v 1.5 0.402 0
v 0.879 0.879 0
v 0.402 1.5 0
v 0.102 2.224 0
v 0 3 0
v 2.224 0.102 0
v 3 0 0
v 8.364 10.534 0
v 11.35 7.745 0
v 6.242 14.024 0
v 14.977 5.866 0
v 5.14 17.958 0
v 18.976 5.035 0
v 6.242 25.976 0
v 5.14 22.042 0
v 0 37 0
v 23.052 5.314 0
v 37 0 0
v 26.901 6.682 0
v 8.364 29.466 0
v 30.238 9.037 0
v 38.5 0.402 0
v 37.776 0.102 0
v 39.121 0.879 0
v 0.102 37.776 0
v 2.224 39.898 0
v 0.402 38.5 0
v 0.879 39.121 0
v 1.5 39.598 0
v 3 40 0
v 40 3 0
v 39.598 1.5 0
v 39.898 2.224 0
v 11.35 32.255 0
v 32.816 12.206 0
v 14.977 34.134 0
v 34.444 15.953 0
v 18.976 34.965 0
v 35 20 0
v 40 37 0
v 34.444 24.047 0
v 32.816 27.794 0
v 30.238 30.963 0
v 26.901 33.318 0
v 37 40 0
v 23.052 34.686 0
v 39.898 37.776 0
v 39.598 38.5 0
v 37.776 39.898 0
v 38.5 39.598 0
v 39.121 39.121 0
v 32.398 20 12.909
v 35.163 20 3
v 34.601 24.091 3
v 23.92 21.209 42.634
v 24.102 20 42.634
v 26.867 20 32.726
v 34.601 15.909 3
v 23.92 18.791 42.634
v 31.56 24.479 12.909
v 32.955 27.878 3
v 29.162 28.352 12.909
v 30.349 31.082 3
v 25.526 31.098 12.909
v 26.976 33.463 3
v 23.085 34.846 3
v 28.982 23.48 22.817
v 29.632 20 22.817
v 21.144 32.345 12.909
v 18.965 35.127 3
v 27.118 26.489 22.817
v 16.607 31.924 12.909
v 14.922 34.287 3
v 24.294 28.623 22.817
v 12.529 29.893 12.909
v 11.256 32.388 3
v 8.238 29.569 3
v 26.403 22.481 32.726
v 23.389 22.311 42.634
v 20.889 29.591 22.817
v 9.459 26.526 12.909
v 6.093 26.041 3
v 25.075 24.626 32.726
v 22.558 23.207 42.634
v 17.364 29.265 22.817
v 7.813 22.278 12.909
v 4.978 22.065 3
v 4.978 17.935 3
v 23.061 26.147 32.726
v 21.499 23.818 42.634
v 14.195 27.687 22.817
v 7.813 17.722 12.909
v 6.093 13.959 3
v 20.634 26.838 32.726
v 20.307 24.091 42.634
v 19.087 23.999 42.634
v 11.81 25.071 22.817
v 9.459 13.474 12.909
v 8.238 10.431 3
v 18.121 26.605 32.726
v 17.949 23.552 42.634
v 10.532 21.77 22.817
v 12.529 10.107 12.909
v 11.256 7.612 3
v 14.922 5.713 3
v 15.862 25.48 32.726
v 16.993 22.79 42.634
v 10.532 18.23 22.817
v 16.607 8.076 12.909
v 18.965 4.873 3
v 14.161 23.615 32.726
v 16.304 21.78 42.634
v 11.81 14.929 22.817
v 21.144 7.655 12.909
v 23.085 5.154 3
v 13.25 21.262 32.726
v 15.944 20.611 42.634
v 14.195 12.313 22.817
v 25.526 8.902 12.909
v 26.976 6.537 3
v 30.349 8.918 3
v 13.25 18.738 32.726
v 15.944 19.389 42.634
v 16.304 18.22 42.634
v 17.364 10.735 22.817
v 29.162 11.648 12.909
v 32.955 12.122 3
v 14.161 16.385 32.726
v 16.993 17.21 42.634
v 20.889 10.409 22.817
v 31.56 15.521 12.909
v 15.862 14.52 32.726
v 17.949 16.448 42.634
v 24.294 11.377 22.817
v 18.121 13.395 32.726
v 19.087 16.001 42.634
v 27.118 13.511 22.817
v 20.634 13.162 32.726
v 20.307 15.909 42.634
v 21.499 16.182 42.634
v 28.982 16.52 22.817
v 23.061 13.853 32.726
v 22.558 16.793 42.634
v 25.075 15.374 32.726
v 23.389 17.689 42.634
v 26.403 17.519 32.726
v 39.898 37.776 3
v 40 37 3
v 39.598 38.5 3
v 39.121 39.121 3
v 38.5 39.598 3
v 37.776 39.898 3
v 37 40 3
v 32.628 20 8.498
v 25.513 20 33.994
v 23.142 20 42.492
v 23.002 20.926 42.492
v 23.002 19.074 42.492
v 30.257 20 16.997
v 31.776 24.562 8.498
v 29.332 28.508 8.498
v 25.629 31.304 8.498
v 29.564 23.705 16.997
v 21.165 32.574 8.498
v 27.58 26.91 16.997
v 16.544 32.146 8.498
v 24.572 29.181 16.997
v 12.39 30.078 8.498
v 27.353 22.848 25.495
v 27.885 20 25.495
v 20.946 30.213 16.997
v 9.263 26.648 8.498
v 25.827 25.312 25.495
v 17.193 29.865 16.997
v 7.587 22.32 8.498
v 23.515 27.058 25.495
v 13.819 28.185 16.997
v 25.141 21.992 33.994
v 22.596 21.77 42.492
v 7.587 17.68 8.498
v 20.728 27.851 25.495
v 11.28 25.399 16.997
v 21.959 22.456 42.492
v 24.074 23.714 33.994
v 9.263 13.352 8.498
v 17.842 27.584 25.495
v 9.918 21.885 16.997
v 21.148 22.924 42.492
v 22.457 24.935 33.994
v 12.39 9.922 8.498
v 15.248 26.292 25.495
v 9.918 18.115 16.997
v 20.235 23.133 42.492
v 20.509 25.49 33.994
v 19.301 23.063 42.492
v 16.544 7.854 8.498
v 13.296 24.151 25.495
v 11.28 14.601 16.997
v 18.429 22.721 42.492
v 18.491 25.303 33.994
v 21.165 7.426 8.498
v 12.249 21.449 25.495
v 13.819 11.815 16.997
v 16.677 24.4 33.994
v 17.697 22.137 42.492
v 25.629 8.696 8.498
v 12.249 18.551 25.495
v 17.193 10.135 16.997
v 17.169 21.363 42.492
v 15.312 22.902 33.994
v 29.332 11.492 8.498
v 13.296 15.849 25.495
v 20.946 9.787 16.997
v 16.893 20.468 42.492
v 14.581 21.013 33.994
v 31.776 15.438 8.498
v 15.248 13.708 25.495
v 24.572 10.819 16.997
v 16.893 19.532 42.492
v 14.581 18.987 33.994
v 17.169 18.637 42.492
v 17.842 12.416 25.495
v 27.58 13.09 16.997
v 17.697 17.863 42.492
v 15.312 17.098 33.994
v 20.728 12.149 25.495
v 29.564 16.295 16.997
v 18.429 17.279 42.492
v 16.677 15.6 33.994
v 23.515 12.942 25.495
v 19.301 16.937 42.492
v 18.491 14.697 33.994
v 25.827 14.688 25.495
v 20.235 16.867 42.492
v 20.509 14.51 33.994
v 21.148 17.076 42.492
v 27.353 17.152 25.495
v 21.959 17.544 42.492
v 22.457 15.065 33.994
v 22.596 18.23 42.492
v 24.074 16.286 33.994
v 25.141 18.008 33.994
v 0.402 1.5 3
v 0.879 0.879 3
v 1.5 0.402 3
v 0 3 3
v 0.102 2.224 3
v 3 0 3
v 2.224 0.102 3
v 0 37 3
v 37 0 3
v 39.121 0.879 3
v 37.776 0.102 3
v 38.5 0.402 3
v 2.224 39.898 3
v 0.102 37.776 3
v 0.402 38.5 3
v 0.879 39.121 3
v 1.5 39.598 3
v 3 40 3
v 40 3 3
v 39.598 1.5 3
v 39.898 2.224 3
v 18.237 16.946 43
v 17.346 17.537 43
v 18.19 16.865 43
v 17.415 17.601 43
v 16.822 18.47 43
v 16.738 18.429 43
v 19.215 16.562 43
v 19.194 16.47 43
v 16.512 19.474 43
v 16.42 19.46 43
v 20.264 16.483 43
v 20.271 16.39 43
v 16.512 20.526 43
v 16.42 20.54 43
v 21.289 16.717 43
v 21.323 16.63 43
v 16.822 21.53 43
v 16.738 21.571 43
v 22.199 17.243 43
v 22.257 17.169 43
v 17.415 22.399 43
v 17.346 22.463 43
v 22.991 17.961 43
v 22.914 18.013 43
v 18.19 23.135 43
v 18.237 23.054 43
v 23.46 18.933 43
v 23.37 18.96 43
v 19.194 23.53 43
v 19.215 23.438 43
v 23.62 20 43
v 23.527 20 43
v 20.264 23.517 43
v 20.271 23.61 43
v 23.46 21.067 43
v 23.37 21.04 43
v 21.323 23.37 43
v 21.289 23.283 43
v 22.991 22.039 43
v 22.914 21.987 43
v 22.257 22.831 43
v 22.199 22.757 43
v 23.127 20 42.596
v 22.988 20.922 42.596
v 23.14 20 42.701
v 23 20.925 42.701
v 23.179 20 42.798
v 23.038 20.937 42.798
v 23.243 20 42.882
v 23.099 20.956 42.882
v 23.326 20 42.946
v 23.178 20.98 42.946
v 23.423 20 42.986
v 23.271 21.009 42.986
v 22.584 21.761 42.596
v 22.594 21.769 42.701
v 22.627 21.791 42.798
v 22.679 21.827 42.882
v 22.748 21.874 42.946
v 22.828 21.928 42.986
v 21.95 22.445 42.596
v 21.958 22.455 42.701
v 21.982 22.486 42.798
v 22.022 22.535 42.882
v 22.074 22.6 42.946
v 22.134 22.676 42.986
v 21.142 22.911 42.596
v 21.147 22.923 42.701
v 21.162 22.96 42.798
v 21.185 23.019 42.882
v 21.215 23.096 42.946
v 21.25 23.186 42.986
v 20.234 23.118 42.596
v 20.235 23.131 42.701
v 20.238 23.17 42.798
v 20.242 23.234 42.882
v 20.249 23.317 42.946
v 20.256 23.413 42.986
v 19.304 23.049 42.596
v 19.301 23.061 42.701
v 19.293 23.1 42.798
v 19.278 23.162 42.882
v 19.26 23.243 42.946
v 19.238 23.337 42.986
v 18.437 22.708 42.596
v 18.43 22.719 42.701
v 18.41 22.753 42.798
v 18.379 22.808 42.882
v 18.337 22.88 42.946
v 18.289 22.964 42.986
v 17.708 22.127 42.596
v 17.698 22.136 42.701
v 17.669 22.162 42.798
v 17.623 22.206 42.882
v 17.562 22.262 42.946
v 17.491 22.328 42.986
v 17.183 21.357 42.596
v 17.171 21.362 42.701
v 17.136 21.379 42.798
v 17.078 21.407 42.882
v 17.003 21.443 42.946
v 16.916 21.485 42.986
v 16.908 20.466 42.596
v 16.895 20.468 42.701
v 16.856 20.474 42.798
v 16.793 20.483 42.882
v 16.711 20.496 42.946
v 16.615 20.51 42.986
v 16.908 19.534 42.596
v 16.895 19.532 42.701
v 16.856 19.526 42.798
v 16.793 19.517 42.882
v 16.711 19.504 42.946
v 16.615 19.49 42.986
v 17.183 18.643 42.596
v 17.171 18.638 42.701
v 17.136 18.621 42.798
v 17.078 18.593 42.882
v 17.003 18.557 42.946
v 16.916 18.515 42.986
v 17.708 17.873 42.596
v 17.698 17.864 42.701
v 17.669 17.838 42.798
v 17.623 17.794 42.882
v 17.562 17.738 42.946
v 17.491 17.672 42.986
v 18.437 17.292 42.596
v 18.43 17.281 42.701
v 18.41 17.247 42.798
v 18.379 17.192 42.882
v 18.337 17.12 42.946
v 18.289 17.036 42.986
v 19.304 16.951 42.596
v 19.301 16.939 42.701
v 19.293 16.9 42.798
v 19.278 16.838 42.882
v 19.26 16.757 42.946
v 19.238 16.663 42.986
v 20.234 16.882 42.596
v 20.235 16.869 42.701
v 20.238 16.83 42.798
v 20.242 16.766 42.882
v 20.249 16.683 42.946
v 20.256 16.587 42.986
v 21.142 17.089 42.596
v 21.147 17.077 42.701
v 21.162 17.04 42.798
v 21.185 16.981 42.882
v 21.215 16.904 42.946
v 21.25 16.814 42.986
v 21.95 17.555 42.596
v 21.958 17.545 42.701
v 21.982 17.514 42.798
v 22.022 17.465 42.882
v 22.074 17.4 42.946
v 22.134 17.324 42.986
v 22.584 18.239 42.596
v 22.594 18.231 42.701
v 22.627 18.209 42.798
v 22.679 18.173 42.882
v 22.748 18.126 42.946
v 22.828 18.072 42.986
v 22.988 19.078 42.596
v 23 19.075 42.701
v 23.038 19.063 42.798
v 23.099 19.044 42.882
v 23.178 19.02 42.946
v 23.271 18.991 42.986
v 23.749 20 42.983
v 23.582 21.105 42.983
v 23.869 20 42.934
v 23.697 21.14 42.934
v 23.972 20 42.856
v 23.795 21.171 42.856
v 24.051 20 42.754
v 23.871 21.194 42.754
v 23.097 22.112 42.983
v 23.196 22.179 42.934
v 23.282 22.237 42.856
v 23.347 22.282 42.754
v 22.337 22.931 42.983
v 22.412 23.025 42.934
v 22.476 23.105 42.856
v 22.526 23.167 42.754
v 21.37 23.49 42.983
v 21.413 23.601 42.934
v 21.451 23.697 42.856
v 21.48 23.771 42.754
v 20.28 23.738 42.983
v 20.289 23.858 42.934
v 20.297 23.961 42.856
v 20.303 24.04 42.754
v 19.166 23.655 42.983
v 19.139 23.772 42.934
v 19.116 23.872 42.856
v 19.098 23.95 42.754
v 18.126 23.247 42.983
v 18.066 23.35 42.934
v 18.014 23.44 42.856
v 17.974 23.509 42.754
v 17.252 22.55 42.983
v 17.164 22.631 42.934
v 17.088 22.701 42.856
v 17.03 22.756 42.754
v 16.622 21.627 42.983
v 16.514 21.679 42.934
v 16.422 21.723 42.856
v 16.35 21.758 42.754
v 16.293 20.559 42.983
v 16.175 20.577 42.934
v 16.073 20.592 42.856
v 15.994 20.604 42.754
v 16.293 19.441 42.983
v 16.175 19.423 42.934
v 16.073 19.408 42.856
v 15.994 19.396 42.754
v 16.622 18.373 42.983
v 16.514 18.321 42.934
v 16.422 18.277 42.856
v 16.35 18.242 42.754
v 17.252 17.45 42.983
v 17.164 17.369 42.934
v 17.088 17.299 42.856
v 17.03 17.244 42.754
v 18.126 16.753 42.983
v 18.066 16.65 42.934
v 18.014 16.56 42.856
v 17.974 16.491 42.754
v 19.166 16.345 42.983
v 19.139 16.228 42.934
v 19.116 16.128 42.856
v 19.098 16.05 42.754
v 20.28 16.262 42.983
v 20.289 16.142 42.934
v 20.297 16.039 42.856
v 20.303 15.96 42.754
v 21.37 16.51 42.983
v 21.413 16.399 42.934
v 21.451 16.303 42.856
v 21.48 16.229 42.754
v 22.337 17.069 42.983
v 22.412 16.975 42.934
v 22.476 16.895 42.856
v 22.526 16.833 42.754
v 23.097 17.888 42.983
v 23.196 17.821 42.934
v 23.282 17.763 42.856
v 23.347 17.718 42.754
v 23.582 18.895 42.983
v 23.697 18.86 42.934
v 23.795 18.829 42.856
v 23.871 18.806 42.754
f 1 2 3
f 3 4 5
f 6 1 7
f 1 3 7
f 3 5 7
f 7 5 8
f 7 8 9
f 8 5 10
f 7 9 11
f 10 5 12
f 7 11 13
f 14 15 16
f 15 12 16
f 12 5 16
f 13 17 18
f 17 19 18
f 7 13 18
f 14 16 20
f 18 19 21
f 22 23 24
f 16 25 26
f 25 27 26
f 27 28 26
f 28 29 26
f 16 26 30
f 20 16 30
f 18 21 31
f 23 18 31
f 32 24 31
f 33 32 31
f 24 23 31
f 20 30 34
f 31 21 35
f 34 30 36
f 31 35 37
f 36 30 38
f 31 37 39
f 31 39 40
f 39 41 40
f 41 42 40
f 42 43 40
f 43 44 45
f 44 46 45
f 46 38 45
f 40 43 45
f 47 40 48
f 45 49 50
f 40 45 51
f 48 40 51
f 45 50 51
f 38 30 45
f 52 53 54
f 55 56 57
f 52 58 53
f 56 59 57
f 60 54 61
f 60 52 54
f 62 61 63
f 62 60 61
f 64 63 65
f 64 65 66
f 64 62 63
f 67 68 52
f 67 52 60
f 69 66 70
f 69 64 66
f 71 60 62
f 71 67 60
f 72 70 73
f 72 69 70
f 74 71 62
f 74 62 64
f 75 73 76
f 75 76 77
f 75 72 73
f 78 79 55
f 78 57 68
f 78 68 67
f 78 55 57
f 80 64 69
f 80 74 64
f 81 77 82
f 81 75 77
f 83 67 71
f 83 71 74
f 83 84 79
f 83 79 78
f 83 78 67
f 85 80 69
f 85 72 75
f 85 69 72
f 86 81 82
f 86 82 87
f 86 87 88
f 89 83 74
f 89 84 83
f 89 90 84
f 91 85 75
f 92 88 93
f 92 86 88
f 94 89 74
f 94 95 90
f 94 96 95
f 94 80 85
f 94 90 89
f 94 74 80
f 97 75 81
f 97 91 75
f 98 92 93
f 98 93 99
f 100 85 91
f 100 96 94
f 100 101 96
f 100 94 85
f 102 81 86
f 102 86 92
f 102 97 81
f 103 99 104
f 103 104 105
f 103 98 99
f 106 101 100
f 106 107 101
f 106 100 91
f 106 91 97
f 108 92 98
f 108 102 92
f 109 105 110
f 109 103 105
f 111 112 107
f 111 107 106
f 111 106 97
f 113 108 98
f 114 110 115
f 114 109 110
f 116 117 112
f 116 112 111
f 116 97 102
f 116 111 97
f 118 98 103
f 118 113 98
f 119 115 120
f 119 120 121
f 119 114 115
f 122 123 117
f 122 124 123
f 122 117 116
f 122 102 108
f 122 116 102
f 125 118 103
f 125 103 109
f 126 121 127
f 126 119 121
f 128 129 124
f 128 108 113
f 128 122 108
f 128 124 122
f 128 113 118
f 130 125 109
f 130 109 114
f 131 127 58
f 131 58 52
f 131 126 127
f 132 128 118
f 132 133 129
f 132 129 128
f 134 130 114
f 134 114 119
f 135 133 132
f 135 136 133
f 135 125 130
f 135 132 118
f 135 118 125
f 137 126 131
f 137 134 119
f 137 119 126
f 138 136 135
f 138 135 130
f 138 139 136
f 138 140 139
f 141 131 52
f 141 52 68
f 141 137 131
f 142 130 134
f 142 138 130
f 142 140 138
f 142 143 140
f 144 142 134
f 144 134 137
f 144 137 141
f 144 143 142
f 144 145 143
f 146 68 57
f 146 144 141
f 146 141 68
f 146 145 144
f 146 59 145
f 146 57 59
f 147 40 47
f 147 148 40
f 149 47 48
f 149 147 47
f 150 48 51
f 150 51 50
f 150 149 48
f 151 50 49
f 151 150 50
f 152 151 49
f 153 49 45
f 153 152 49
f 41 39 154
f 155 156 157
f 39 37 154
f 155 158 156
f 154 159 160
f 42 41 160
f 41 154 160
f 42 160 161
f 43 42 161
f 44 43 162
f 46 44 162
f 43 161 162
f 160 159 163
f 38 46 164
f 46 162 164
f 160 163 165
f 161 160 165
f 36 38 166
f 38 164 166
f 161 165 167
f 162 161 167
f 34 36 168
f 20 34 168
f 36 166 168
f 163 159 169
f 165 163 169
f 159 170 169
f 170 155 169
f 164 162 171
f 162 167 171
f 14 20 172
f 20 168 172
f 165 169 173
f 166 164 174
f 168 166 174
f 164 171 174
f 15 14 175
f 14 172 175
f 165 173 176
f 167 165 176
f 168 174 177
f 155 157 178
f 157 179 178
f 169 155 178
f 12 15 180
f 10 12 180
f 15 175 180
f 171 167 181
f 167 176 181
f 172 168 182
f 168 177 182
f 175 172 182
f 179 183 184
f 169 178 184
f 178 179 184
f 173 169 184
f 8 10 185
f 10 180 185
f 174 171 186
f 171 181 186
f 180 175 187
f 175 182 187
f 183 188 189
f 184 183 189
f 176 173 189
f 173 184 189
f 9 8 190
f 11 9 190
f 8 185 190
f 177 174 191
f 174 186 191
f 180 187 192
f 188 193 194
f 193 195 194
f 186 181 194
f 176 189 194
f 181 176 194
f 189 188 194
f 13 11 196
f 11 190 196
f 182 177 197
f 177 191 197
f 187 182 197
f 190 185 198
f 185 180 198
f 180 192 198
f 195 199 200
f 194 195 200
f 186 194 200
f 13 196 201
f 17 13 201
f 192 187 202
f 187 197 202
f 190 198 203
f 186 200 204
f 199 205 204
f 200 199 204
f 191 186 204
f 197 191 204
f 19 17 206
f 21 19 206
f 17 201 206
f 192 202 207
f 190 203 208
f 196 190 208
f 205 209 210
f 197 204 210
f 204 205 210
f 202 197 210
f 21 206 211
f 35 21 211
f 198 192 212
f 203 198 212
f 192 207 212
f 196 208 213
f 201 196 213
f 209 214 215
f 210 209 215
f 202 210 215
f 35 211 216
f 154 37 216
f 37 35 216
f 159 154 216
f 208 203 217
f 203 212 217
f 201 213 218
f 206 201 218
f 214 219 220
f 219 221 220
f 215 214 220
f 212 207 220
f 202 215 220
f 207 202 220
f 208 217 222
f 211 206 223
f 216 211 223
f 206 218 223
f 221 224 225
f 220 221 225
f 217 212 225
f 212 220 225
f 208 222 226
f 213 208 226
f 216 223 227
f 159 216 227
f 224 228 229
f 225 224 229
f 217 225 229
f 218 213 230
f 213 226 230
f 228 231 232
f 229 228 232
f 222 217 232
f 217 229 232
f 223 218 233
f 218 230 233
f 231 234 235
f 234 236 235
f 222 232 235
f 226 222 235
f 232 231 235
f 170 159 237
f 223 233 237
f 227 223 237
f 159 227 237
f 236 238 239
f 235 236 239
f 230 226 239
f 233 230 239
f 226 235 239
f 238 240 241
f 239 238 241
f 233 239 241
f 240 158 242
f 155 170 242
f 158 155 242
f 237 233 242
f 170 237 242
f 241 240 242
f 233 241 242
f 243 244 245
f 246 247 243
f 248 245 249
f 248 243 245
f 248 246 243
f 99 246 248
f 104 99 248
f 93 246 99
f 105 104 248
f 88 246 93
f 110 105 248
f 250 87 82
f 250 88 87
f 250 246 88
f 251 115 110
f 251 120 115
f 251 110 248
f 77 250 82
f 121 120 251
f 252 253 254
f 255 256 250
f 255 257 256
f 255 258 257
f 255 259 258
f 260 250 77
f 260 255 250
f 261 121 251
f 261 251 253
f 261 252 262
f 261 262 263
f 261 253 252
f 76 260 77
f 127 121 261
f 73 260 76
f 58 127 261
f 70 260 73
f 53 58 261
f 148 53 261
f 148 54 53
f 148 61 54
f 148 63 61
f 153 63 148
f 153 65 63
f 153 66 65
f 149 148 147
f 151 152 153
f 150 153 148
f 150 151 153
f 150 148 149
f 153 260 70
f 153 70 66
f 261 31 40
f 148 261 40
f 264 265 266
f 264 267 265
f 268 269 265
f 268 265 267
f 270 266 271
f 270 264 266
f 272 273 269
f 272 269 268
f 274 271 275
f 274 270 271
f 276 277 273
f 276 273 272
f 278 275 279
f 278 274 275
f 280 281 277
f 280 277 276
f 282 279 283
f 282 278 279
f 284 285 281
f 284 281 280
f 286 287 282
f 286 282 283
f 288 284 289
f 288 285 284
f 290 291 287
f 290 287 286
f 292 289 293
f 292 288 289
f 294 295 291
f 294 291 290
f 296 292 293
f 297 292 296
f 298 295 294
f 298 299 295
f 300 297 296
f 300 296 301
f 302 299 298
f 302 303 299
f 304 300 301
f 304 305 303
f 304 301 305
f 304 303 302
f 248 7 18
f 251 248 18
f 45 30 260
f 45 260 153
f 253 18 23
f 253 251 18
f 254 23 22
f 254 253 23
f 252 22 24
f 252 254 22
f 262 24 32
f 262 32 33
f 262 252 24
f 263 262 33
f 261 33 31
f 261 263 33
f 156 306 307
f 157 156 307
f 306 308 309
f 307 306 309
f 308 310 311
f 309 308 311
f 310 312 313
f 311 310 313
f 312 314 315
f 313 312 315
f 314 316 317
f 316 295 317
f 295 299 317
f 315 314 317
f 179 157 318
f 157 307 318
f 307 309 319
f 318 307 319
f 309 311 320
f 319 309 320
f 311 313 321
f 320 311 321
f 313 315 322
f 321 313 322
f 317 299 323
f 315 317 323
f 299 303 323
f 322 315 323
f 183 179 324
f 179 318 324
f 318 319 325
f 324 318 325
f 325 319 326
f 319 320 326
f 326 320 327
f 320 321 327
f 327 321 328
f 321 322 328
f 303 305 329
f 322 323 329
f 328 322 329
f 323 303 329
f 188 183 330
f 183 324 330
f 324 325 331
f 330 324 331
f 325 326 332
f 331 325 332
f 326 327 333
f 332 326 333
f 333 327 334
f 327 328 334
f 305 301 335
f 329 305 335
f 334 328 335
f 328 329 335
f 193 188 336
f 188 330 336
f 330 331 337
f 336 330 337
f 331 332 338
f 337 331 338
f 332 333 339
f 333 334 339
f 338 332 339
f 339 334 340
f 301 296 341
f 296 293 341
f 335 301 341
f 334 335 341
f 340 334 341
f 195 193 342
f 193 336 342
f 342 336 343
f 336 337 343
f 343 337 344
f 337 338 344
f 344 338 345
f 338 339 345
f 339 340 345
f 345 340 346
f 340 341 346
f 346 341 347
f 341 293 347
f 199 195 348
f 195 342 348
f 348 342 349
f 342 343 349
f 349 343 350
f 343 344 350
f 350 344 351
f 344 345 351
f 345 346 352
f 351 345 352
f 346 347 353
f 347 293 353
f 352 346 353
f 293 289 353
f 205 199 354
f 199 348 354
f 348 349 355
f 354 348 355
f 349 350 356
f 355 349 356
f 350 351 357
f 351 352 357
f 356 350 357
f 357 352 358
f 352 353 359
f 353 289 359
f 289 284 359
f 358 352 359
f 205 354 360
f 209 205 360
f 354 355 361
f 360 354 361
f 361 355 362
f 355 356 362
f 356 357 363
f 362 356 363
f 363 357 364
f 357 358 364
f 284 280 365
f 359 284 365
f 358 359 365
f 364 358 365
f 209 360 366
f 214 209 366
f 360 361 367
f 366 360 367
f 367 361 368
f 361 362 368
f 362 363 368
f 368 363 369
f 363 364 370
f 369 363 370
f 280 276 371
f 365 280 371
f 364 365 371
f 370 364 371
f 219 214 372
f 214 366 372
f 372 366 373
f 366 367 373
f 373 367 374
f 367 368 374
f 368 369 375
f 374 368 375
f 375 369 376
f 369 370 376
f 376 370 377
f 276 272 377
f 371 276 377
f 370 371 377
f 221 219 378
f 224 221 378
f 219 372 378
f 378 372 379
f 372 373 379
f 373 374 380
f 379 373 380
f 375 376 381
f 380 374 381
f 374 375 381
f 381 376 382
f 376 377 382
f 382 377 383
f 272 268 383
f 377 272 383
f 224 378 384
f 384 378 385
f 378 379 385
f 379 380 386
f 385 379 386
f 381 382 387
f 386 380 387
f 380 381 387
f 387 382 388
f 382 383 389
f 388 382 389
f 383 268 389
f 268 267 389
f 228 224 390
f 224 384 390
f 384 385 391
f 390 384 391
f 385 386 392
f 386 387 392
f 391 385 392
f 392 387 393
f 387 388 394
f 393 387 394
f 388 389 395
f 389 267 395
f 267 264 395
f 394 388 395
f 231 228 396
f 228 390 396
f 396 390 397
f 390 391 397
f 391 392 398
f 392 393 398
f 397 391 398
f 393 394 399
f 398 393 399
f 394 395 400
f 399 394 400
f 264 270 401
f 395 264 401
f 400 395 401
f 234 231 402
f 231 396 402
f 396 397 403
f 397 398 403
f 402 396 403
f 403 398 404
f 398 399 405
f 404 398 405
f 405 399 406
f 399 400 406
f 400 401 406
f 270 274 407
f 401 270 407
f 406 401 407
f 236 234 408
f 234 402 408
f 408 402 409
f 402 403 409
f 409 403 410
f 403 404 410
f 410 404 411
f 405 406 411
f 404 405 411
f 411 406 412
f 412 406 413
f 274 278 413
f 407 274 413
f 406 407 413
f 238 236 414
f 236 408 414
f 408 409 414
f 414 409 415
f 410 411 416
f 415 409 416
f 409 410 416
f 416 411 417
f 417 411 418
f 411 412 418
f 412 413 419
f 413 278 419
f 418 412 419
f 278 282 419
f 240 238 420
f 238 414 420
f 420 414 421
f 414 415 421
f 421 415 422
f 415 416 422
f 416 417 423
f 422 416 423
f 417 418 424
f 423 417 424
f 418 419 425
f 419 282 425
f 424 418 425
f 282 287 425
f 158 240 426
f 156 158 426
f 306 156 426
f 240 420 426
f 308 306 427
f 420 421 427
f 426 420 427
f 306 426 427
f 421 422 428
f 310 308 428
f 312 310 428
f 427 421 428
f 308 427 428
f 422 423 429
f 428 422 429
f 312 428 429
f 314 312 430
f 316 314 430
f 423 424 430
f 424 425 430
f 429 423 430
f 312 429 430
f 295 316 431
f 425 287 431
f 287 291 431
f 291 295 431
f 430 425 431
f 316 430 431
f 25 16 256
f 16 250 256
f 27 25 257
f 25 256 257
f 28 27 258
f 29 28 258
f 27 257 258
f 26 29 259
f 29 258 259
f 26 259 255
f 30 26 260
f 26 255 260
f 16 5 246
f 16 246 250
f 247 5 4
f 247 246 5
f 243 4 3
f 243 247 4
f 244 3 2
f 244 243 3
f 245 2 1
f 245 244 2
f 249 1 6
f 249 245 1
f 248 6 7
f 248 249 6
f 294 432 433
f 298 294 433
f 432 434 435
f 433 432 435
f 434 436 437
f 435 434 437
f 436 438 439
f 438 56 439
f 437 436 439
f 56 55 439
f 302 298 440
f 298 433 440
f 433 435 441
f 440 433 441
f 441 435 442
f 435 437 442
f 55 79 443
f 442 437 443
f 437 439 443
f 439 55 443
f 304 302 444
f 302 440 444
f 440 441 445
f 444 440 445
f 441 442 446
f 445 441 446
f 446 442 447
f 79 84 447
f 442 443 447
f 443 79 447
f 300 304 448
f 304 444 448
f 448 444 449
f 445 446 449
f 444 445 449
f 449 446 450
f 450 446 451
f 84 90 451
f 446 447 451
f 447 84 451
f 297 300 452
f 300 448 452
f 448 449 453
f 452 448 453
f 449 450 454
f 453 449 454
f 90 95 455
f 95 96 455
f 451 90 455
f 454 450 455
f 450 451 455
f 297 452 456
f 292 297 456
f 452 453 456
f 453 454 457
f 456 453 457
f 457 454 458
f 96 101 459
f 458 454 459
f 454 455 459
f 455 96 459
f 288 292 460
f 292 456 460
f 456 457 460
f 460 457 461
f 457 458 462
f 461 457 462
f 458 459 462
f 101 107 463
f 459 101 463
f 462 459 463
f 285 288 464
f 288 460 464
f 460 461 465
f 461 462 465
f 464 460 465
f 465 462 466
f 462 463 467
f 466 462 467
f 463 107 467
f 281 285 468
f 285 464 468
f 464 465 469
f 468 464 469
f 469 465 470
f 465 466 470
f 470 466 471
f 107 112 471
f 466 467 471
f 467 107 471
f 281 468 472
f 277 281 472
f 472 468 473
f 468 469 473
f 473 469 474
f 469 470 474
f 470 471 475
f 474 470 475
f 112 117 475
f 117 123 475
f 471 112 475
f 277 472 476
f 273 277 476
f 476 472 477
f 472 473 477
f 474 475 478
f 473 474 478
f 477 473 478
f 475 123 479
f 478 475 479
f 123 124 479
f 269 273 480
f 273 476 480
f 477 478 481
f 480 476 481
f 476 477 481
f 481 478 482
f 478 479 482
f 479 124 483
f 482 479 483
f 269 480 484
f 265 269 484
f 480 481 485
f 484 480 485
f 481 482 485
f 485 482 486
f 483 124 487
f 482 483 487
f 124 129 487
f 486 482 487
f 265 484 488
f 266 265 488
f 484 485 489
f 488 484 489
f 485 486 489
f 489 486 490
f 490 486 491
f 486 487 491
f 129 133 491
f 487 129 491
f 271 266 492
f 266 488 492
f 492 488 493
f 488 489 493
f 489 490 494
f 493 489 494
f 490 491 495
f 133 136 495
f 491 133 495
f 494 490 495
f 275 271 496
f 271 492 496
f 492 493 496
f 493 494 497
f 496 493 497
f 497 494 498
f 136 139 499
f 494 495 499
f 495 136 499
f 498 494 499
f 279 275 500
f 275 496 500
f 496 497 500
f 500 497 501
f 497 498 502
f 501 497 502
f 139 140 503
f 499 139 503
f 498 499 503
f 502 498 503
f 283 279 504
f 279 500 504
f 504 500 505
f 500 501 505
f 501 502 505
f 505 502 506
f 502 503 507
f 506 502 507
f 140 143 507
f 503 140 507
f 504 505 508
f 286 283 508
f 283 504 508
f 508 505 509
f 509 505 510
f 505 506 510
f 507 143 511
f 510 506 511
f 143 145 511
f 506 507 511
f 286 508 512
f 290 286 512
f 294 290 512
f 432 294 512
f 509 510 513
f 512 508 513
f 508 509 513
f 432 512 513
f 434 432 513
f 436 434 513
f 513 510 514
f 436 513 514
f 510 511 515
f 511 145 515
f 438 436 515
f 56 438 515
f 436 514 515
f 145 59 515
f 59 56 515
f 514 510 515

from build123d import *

# Parameters (mm, degrees)
FILLET001_R = 0.4
FILLET002_R = 0.5
BOX_W       = 40
BOX_H       = 40
BOX_DEPTH   = 3
FILLET_R    = 3


with BuildPart() as cono_interior:
    # Cone001 → Cone001 (revolve)
    with BuildSketch(Plane(origin=(20, 20, 0), x_dir=(1, 0, 0), z_dir=(0, -1, 0))):
        Polygon((0, 0), (15, 0), (3, 43), (0, 43), align=None)
    revolve(axis=Axis((20, 20, 0), (0, 0, 1)))


with BuildPart() as cono_redondeado:
    # Cone → Cone (revolve)
    with BuildSketch(Plane(origin=(20, 20, 0), x_dir=(1, 0, 0), z_dir=(0, -1, 0))):
        Polygon((0, 0), (16, 0), (4, 43), (0, 43), align=None)
    revolve(axis=Axis((20, 20, 0), (0, 0, 1)))

    # Cut: cut cono_interior
    add(cono_interior.part, mode=Mode.SUBTRACT)

    # Fillet001
    fillet001_edges = [cono_redondeado.edges().sort_by_distance(p)[0] for p in [
        (17, 20, 43),
    ]]
    fillet(fillet001_edges, radius=FILLET001_R)

    # Fillet002
    fillet002_edges = [cono_redondeado.edges().sort_by_distance(p)[0] for p in [
        (16, 20, 43),
    ]]
    fillet(fillet002_edges, radius=FILLET002_R)


with BuildPart() as cono_final:
    # Box → Box (new body)
    with BuildSketch(Plane.XY):
        with Locations((20, 20)):
            Rectangle(BOX_W, BOX_H)
    extrude(amount=BOX_DEPTH)

    # Fillet
    fillet_edges = [cono_final.edges().sort_by_distance(p)[0] for p in [
        (0, 0, 1.5),
        (0, 40, 1.5),
        (40, 0, 1.5),
        (40, 40, 1.5),
    ]]
    fillet(fillet_edges, radius=FILLET_R)

    # Cut001: cut cono_interior
    add(cono_interior.part, mode=Mode.SUBTRACT)

    # Fusion: union cono_redondeado
    add(cono_redondeado.part)


solid = cono_final.part
